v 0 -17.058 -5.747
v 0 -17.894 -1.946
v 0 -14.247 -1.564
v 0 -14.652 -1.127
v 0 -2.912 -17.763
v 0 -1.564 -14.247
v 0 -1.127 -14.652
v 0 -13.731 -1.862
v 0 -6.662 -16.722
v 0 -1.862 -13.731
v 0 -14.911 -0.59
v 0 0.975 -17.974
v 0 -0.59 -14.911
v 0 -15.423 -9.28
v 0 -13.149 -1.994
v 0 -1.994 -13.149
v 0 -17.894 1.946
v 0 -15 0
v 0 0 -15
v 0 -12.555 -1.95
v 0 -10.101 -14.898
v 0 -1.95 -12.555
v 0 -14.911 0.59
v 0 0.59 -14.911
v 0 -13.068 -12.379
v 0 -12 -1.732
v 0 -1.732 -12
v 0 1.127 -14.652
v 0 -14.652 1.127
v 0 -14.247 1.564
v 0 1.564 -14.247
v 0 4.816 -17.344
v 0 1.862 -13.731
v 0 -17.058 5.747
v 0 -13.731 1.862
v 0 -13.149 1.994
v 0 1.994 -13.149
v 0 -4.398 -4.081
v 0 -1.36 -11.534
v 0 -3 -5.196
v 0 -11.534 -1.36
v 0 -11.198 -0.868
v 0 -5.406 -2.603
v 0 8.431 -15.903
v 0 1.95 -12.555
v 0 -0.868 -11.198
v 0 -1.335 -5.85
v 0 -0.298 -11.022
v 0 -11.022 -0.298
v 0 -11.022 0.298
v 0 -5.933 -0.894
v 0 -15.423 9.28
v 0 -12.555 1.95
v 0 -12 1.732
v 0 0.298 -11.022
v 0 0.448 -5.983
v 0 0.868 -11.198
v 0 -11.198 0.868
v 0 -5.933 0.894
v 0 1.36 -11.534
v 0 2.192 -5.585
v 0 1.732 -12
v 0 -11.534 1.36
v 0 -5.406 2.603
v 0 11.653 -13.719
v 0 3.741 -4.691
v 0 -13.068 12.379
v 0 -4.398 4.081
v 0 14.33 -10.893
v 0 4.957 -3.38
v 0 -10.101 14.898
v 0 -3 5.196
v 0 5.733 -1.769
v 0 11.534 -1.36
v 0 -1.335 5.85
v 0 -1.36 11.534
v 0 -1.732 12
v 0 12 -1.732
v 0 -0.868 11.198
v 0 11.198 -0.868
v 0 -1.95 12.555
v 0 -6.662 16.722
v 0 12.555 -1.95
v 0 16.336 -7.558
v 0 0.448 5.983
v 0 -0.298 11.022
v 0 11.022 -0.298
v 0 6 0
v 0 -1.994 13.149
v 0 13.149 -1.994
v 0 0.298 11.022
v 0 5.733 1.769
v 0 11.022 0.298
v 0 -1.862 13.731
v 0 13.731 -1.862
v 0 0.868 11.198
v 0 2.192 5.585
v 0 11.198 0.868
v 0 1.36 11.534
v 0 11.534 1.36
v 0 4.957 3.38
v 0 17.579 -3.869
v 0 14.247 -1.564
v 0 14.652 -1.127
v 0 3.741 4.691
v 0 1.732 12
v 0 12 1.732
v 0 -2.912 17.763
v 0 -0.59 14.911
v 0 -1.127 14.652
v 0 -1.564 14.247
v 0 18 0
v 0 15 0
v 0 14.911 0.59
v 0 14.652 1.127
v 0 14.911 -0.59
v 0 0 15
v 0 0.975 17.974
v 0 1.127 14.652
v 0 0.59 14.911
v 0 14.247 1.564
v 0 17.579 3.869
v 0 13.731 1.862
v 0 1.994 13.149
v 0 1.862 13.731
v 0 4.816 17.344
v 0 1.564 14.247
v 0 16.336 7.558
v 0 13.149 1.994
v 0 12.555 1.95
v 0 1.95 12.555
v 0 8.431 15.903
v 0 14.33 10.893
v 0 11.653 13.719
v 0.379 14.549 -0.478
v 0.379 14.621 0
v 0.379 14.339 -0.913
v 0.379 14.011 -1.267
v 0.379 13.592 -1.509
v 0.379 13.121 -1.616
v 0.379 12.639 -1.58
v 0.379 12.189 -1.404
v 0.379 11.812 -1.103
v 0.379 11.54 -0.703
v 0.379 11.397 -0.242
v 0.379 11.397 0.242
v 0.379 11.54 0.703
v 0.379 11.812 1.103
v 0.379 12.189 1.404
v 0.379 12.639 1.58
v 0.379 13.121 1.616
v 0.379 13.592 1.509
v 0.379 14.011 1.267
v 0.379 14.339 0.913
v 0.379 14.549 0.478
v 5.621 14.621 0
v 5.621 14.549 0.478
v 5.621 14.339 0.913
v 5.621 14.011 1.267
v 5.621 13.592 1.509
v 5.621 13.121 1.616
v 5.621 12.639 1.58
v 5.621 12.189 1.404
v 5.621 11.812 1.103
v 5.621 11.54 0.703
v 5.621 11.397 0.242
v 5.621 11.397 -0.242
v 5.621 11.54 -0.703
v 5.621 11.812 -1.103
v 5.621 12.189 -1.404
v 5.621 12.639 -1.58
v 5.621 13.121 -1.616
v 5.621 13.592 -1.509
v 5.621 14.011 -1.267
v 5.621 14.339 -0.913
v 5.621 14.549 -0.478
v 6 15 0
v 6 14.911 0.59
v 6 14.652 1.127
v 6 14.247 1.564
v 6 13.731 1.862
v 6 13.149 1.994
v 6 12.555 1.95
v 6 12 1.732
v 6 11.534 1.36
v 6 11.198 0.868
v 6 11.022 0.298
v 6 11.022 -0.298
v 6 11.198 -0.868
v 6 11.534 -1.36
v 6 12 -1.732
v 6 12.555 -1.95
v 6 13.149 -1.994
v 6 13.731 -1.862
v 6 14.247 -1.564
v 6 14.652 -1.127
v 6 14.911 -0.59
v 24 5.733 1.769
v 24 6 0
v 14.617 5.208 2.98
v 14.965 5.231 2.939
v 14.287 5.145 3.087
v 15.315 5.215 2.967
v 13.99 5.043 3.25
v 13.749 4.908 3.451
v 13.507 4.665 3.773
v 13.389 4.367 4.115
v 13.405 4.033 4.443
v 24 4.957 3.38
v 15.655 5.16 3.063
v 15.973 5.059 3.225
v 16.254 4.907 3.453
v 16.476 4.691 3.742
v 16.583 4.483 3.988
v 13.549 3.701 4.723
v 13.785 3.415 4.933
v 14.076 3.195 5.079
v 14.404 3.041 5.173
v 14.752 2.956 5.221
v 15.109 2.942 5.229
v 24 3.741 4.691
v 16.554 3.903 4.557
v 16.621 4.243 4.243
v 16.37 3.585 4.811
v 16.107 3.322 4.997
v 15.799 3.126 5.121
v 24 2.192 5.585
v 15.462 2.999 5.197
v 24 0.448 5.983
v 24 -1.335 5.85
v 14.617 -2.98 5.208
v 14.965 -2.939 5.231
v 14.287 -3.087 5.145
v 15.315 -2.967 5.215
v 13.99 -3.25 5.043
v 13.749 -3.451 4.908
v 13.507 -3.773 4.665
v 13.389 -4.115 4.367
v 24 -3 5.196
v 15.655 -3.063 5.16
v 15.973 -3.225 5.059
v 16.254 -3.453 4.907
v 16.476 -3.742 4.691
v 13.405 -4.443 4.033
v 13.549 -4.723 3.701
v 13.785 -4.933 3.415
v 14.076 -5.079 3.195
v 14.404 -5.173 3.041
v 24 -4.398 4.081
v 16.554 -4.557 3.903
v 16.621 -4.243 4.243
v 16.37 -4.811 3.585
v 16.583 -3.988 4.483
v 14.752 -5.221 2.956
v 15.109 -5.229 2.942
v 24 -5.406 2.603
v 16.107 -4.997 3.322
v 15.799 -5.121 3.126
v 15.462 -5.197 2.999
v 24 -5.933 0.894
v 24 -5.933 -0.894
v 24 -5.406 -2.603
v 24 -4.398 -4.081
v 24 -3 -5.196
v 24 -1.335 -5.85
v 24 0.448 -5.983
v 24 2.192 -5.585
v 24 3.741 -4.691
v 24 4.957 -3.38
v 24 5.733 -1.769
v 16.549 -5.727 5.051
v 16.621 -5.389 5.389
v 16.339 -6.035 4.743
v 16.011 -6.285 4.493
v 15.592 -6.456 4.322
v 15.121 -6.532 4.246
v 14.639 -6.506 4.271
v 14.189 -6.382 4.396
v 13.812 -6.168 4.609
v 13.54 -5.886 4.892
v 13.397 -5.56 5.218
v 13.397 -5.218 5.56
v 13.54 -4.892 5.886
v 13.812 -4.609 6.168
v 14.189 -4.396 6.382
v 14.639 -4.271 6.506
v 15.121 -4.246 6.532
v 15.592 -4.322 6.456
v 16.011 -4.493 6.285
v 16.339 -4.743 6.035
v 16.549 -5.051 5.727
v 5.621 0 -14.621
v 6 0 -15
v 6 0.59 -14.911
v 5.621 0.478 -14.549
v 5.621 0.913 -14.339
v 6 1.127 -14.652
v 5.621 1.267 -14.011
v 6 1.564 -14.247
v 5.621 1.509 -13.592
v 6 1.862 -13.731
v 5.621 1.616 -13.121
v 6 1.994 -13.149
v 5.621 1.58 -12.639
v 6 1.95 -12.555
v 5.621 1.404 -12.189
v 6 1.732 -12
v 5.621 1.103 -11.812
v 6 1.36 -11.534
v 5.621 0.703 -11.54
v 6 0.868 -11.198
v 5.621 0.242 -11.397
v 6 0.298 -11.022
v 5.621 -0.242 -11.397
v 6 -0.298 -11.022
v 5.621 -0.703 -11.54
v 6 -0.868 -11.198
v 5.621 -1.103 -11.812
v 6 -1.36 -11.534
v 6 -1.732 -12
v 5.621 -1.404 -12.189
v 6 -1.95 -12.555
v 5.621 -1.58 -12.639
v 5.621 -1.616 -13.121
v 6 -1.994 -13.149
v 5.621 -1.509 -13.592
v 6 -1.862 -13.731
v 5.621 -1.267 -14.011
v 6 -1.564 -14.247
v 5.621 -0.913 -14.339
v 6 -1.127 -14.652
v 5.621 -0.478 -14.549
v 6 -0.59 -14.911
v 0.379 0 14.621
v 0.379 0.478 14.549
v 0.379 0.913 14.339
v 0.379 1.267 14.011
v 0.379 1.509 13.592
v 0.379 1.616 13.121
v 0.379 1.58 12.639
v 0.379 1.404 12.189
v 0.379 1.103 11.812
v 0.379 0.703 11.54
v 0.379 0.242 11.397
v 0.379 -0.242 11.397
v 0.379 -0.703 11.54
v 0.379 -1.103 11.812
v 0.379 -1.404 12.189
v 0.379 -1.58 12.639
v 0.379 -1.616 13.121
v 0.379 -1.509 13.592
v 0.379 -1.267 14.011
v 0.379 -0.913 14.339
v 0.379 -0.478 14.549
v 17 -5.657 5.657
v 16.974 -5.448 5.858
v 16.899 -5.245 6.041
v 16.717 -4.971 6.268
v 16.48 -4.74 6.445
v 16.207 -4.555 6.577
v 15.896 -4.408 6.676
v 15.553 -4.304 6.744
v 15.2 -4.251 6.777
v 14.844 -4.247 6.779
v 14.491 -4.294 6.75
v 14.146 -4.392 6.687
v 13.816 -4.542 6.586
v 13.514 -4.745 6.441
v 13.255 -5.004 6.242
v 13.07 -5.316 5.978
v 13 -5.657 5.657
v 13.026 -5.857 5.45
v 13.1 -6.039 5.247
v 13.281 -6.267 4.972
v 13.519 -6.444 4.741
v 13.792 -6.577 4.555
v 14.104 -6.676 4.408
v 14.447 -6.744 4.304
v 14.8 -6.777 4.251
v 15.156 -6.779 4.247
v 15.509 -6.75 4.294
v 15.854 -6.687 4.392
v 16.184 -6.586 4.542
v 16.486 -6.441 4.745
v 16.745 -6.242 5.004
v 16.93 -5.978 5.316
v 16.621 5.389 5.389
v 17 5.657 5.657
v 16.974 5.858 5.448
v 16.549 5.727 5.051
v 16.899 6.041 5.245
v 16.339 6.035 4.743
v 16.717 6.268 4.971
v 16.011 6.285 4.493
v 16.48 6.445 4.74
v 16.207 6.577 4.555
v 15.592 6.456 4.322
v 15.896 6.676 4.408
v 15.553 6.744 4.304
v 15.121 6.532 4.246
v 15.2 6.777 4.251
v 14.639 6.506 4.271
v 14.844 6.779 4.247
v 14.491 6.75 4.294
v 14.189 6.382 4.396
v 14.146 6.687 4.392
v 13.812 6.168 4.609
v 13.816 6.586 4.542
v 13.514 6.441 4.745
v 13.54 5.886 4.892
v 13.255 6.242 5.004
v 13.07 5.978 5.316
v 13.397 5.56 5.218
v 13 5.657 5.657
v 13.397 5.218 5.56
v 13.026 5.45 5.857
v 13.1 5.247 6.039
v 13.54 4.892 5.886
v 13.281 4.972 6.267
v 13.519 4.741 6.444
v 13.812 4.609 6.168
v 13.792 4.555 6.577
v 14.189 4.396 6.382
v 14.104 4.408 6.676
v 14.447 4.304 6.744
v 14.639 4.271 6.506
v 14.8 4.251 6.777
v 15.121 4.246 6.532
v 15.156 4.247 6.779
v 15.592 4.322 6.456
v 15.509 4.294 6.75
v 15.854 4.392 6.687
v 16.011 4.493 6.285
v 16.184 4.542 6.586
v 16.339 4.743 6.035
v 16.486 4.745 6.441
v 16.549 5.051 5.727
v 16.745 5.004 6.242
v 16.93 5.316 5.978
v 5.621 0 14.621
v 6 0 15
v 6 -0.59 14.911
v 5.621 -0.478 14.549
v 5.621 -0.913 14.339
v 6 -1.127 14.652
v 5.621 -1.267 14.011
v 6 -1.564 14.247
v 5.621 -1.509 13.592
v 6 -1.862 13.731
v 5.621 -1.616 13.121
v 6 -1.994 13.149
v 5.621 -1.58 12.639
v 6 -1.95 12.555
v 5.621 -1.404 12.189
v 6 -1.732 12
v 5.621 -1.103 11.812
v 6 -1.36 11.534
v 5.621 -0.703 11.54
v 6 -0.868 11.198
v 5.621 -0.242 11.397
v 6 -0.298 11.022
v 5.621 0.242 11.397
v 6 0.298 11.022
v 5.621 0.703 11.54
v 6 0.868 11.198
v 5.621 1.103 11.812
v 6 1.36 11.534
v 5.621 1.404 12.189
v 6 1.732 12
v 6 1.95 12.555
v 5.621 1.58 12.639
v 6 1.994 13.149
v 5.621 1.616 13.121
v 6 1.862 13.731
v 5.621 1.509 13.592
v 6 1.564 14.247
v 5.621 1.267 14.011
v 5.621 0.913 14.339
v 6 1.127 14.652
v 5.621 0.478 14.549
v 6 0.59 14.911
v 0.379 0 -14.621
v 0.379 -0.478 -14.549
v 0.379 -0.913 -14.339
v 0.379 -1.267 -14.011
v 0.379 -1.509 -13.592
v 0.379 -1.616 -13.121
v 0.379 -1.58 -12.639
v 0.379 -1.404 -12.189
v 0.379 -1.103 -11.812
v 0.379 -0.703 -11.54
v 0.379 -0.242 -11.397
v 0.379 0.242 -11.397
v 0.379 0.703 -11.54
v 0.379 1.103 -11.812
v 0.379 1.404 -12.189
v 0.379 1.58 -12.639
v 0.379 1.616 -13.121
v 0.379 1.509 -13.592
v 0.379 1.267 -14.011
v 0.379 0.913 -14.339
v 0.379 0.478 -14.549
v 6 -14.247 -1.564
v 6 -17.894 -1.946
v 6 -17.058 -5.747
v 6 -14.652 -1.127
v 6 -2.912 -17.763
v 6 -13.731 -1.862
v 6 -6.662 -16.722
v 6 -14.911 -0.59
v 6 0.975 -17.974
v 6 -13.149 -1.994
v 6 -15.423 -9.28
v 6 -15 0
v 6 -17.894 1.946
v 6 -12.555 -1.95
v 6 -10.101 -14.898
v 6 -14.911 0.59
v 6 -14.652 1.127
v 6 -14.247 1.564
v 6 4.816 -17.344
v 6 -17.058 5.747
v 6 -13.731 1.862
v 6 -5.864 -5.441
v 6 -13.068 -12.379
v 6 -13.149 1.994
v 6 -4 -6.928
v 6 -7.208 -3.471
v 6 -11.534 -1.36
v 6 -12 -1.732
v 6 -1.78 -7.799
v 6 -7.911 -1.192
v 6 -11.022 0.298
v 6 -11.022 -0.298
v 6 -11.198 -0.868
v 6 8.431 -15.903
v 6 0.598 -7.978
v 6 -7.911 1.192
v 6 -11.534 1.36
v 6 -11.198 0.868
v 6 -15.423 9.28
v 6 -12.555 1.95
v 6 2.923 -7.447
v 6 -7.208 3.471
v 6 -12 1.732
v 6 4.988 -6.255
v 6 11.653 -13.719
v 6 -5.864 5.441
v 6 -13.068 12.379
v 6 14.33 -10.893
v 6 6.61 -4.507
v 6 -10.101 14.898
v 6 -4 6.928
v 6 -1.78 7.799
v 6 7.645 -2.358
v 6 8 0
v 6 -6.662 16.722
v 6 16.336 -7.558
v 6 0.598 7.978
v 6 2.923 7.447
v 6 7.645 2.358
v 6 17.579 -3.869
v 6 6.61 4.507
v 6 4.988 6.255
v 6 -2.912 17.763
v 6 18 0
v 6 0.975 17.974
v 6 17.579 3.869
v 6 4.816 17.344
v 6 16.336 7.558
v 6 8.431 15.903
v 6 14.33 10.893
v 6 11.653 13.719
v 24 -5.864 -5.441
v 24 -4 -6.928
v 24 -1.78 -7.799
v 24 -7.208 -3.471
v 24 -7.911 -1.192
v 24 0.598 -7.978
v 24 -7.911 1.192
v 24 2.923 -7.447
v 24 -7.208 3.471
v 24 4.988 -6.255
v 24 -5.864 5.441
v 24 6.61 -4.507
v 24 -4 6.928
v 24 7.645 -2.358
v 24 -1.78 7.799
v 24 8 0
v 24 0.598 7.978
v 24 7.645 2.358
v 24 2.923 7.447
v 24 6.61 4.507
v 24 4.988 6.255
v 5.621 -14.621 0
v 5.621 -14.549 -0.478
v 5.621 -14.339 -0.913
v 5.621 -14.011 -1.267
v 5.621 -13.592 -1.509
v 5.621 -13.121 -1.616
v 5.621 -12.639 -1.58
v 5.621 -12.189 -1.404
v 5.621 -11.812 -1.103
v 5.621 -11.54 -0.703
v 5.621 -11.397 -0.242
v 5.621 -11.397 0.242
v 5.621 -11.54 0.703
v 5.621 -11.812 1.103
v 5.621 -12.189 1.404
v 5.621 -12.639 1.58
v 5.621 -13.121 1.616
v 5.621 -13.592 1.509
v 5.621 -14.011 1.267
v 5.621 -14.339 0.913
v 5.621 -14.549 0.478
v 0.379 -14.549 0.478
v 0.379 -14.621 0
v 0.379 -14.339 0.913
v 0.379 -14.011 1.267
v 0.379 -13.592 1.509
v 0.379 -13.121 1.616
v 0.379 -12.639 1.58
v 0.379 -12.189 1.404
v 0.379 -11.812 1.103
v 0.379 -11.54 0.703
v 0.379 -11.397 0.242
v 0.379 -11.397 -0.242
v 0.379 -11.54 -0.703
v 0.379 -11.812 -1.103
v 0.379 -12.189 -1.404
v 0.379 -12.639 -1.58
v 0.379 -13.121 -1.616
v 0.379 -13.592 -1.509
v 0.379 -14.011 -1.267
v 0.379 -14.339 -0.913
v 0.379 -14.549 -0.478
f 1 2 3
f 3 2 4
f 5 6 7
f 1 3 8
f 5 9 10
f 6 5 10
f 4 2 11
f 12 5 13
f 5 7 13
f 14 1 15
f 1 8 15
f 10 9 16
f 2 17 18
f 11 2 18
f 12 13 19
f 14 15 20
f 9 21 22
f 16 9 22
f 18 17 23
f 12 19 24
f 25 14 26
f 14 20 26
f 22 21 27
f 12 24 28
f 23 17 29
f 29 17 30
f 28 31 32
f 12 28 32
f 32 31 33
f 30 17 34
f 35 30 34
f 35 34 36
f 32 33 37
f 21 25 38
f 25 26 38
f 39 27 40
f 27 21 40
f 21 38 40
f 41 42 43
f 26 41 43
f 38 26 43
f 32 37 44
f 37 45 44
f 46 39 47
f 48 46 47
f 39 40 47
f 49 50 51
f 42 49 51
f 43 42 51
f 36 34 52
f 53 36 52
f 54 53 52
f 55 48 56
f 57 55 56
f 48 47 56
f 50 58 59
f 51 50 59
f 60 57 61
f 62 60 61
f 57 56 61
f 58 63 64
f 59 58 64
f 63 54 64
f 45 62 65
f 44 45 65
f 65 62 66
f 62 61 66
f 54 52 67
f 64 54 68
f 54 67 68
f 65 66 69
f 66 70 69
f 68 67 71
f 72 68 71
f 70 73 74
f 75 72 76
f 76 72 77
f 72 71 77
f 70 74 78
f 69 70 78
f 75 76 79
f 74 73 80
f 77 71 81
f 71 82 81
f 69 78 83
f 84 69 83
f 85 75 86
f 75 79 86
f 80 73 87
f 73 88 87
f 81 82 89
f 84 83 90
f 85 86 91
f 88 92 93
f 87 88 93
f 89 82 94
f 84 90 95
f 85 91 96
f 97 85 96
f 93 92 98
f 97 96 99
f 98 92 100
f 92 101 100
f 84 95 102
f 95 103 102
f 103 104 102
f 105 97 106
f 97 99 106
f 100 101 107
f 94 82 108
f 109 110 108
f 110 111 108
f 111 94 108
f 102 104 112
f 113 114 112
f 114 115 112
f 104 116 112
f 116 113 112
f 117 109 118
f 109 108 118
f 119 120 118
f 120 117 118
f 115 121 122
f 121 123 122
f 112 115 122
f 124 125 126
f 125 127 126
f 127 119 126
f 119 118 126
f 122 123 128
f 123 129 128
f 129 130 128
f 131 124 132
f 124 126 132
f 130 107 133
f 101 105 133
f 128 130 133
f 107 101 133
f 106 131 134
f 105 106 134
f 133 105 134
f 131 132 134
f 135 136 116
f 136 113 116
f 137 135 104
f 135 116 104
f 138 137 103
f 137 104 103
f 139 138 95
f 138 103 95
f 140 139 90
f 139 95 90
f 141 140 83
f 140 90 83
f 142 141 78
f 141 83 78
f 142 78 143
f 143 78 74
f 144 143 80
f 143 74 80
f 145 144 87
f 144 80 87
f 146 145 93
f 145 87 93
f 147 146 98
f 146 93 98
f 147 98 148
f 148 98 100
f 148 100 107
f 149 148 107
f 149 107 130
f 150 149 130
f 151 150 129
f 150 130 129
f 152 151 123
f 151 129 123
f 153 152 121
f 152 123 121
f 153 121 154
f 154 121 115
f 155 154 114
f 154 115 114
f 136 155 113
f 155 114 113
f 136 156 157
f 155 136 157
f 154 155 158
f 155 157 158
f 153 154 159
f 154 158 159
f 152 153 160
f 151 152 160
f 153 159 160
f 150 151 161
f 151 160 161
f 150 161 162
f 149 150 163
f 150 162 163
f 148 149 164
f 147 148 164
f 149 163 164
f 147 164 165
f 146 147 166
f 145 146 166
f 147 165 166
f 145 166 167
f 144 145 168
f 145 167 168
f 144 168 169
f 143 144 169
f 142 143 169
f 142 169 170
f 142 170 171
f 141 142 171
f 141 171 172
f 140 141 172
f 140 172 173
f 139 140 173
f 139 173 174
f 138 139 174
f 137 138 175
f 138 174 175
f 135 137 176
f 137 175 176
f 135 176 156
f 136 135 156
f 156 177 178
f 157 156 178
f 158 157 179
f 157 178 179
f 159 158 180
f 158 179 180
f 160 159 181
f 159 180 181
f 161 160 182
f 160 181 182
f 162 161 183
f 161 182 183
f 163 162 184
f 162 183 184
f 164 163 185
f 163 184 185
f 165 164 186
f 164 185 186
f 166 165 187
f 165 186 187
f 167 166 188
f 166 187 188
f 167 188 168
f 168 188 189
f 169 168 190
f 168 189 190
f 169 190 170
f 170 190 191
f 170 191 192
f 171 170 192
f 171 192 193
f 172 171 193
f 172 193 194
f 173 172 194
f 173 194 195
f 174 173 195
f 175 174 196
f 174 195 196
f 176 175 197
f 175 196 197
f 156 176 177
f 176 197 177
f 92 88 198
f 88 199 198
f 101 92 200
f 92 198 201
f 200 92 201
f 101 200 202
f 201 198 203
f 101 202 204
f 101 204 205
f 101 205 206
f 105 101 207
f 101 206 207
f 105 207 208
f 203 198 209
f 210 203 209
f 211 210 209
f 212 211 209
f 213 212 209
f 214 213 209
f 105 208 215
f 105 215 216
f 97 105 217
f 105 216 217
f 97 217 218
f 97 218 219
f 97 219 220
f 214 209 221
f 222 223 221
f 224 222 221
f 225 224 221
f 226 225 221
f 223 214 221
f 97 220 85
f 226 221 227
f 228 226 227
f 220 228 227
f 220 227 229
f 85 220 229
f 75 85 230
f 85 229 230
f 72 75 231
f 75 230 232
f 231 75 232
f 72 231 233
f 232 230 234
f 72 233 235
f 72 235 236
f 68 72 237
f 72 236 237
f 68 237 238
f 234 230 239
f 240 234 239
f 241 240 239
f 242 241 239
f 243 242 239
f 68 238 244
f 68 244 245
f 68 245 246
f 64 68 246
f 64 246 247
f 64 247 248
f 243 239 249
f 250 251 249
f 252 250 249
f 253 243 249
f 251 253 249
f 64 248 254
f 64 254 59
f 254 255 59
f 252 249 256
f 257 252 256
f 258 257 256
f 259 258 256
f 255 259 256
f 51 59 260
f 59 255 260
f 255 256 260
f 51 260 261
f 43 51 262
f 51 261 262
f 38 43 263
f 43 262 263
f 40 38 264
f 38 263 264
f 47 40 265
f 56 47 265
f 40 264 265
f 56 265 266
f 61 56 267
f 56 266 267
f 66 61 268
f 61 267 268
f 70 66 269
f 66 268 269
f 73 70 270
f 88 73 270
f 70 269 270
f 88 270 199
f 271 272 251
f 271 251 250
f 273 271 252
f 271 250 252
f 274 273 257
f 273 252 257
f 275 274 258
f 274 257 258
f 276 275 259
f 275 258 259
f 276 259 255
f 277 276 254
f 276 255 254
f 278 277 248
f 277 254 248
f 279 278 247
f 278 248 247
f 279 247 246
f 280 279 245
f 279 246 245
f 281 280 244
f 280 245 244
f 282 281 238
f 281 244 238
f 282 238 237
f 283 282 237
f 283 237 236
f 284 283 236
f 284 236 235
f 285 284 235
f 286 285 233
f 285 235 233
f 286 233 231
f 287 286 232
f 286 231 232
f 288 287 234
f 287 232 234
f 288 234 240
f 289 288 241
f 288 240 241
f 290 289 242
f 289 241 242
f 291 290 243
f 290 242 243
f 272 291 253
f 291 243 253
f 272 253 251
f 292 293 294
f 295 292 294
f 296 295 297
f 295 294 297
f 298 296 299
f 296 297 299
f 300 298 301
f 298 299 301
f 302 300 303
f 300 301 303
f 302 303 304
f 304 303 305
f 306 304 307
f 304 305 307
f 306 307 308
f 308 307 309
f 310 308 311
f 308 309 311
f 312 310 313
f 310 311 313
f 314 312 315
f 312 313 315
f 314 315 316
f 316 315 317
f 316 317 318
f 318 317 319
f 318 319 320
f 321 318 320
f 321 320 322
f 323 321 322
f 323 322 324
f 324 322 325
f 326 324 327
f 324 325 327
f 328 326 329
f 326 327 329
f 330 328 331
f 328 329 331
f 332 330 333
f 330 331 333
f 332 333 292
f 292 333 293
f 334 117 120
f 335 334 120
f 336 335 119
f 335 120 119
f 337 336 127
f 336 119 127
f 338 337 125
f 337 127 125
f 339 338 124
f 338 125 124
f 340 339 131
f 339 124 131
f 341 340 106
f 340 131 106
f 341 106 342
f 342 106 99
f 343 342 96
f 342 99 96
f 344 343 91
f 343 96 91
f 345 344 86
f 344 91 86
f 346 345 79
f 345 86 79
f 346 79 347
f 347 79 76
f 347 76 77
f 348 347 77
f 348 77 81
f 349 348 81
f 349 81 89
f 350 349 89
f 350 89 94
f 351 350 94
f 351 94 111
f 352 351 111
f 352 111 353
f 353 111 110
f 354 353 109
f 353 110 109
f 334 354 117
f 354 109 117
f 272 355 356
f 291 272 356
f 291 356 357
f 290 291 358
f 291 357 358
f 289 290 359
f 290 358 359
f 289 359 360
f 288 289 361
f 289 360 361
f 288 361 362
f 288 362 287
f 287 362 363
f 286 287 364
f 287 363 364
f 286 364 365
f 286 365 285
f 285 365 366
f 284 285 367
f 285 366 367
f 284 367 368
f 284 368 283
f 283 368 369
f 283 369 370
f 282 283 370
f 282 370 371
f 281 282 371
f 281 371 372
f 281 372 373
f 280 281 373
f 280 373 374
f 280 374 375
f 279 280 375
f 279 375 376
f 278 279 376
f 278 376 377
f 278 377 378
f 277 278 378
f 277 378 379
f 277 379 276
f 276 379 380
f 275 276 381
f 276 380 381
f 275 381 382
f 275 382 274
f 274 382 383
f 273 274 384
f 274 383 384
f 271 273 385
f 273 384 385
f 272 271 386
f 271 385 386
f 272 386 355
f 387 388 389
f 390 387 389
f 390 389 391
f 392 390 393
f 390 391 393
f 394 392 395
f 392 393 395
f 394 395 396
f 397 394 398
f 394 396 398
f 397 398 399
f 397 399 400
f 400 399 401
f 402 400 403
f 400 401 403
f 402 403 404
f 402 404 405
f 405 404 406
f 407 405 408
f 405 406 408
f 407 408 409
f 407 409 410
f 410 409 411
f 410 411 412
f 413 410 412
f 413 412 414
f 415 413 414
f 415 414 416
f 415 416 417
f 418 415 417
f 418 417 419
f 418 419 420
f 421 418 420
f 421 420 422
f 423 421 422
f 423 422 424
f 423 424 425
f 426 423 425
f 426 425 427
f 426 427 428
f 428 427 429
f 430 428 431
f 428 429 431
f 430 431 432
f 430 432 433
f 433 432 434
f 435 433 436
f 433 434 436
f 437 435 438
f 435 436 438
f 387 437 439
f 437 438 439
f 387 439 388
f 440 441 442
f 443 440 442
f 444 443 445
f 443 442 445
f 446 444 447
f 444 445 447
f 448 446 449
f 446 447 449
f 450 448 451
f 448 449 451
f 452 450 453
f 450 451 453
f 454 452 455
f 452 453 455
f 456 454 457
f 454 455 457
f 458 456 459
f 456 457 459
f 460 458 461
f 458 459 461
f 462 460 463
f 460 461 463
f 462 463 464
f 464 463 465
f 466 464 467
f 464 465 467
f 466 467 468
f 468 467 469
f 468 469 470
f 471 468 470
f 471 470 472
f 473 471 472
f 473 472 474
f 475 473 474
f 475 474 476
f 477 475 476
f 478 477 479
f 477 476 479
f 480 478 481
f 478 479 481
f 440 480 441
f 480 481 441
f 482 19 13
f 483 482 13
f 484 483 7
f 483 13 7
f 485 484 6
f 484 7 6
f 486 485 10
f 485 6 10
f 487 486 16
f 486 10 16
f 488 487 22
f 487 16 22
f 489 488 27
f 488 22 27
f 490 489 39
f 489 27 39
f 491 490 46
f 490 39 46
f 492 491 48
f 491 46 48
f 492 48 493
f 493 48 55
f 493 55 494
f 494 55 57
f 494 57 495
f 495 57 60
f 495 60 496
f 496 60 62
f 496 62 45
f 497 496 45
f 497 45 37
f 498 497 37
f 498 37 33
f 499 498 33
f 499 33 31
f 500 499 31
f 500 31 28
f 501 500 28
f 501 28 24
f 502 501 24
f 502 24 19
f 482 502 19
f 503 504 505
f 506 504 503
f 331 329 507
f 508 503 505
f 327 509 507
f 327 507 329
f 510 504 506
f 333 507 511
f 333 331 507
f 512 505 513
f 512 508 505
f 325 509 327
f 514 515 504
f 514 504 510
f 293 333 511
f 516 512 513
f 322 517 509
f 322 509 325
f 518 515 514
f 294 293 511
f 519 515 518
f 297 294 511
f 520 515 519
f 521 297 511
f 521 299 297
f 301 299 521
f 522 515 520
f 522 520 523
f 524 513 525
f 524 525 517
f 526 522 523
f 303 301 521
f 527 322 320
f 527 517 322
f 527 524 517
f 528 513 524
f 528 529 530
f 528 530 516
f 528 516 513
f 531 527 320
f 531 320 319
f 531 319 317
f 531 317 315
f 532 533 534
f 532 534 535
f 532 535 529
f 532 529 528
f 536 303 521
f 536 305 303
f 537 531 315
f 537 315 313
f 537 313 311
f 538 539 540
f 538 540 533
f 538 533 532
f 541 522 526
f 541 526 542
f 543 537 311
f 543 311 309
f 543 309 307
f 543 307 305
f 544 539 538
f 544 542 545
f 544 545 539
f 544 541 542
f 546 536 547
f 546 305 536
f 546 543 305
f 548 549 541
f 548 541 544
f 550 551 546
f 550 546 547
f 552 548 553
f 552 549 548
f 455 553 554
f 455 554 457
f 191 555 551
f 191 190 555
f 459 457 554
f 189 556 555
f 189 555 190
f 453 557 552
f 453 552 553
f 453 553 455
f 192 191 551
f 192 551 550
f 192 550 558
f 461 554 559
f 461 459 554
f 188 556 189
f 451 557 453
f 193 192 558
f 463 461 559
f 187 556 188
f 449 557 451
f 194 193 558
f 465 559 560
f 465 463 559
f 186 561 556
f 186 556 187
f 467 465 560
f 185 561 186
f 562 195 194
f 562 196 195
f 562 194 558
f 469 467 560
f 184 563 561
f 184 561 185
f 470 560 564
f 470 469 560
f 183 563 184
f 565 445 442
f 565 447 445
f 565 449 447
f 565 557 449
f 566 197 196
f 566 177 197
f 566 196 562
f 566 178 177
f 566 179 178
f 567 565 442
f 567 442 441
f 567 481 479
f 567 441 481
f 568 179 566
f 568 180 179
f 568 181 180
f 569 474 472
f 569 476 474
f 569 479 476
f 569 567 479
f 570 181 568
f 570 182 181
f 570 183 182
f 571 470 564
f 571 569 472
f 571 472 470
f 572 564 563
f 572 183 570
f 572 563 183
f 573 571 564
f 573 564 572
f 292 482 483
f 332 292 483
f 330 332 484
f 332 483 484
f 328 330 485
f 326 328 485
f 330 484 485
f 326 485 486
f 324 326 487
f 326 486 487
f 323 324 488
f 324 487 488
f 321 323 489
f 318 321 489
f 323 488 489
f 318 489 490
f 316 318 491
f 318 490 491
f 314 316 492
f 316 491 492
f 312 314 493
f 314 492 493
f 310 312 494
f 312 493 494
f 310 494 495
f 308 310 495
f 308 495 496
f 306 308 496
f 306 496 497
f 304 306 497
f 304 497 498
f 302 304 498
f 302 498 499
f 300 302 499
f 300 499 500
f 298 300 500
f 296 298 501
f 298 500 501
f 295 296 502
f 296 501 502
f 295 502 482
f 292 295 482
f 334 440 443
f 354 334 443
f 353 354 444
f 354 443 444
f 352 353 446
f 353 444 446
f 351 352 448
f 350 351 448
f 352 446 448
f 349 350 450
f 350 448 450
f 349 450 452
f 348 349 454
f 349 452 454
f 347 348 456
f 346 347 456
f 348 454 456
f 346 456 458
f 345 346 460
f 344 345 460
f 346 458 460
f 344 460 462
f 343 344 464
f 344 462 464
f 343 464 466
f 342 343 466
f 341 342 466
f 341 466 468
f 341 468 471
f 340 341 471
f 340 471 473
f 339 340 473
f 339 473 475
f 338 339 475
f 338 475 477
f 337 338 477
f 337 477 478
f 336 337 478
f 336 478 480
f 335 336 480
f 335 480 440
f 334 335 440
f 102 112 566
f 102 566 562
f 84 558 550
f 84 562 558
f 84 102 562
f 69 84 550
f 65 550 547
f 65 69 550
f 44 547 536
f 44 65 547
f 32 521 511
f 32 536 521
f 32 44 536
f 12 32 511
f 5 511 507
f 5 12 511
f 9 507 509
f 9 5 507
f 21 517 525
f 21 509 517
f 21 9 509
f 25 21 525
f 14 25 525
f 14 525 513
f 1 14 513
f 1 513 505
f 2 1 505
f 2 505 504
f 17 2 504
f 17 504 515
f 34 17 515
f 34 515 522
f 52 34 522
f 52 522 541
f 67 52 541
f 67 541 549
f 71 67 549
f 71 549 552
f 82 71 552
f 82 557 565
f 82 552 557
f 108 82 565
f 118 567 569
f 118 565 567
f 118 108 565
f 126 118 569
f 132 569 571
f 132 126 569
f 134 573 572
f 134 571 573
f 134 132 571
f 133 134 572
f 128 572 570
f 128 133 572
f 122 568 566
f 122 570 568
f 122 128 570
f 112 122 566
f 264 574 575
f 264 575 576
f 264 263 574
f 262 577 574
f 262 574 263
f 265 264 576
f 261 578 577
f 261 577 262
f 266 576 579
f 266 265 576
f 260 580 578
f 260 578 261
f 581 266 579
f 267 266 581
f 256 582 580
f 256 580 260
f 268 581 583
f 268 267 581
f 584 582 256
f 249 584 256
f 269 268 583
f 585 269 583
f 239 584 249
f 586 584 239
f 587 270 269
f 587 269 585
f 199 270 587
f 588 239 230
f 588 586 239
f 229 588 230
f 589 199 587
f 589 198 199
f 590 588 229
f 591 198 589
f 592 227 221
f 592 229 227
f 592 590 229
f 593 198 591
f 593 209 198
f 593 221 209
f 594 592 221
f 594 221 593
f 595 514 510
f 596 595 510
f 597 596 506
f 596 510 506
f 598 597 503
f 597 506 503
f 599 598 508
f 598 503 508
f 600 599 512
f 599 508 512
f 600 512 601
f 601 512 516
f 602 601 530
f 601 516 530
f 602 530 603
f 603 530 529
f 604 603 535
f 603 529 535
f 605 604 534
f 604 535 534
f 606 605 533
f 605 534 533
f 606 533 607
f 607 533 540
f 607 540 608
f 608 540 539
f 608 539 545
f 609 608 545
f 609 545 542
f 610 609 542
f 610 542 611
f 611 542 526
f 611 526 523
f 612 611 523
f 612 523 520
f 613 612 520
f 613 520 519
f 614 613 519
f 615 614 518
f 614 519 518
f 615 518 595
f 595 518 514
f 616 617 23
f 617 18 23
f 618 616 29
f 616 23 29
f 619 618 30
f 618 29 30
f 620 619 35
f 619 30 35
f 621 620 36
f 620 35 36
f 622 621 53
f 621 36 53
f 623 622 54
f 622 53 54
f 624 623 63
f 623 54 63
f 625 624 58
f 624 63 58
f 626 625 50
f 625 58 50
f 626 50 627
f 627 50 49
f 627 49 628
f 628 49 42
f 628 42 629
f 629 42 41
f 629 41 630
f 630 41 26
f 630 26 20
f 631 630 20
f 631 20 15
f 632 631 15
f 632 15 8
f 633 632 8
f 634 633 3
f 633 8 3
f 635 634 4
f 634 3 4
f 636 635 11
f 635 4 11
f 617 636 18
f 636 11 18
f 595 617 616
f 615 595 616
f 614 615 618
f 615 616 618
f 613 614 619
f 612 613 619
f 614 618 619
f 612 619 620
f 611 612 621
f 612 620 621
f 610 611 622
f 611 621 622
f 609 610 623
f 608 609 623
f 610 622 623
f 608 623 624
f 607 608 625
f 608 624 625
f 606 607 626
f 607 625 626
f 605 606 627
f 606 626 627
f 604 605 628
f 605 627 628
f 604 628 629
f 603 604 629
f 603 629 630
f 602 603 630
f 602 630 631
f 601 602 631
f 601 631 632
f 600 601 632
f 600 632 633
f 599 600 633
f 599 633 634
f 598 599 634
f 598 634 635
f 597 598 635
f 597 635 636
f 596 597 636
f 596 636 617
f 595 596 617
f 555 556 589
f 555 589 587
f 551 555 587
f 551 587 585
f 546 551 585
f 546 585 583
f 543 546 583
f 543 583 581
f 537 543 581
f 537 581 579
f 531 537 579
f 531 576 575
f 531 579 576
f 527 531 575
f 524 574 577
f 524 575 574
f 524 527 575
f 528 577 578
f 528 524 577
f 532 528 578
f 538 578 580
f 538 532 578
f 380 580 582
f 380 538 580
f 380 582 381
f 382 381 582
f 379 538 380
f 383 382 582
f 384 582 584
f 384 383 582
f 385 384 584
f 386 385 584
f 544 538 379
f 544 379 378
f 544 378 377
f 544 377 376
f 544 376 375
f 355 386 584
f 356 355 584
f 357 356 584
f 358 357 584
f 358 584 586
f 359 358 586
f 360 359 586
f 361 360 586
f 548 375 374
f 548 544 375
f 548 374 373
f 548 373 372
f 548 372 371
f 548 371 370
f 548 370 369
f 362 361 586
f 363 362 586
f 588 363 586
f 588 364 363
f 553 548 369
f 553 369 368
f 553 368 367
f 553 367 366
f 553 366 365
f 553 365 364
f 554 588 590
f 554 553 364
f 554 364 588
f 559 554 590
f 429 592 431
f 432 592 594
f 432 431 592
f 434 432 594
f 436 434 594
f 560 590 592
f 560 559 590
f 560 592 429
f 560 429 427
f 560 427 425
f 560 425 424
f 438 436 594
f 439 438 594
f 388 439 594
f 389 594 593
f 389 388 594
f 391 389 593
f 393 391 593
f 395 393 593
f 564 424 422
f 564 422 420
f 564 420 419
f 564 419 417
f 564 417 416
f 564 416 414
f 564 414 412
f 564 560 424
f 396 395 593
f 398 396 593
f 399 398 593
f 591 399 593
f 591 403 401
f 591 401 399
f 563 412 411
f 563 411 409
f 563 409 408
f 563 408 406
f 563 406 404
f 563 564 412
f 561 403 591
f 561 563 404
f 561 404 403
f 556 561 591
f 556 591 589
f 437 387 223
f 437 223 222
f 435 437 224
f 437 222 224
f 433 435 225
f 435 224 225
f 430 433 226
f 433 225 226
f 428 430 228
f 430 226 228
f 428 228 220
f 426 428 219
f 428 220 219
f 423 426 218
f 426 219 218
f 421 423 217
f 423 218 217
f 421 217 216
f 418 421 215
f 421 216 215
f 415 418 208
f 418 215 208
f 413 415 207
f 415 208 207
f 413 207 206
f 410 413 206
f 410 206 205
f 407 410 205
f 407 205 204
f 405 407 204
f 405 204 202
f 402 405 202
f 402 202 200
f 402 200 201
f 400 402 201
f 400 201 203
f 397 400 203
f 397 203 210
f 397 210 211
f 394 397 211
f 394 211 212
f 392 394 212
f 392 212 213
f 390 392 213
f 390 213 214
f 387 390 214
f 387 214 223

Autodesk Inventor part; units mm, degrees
sketch "Sketch_1" plane through (0, 0, 0) normal (0, 0, 1) x (1, 0, 0)
  line L0 (24, 0) -> (0, 0)
  line L1 (0, 18) -> (0, 6)
  line L2 (0, 6) -> (24, 6)
  line L3 (24, 6) -> (24, 8)
  line L4 (24, 8) -> (6, 8)
  line L5 (6, 8) -> (6, 18)
  line L6 (6, 18) -> (0, 18)
revolve "Revolution1" add sketch "Sketch_1" angle 360 about axis through (24, 0, 0) along (1, 0, 0)
sketch "Sketch_3" plane through (0, 0, 0) normal (0, -0.7071, 0.7071) x (1, 0, 0)
  line L0 (15, 5.5) -> (15, 8)
  line L1 (15, 8) -> (17, 8)
  line L2 (17, 8) -> (16.621, 7.621)
  line L3 (16.621, 7.621) -> (16.621, 5.5)
  line L4 (16.621, 5.5) -> (15, 5.5)
  line L5 (15, 5.5) -> (15, 8)
revolve "Revolution2" cut sketch "Sketch_3" angle 360 about axis through (15, 3.8891, 3.8891) along (0, -0.7071, -0.7071)
thread "Thread1" size "M4x0.7" class "6H" standard "ISO Metric profile" length 2.121
sketch "Sketch_2" plane through (0, 0, 0) normal (0, -0.7071, -0.7071) x (1, 0, 0)
  line L0 (15, 5.5) -> (15, 8)
  line L1 (15, 8) -> (17, 8)
  line L2 (17, 8) -> (16.621, 7.621)
  line L3 (16.621, 7.621) -> (16.621, 5.5)
  line L4 (16.621, 5.5) -> (15, 5.5)
  line L5 (15, 5.5) -> (15, 8)
revolve "Revolution3" cut sketch "Sketch_2" angle 360 about axis through (15, -3.8891, 3.8891) along (0, 0.7071, -0.7071)
thread "Thread2" size "M4x0.7" class "6H" standard "ISO Metric profile" length 2.121
sketch "Sketch_4" plane through (0, 0, 0) normal (0, 0, 1) x (1, 0, 0)
  line L0 (6, 13) -> (0, 13)
  line L1 (0, 13) -> (0, 15)
  line L2 (0, 15) -> (0.379, 14.621)
  line L3 (0.379, 14.621) -> (5.621, 14.621)
  line L4 (5.621, 14.621) -> (6, 15)
  line L5 (6, 15) -> (6, 13)
  line L6 (6, 13) -> (0, 13)
revolve "Revolution4" cut sketch "Sketch_4" angle 360 about axis through (6, 13, 0) along (1, 0, 0)
thread "Thread3" size "M4x0.7" class "6H" standard "ISO Metric profile" full length
sketch "Sketch_9" plane through (0, 0, 0) normal (0, -1, 0) x (1, 0, 0)
  line L0 (0, -13) -> (6, -13)
  line L1 (6, -13) -> (6, -15)
  line L2 (6, -15) -> (5.621, -14.621)
  line L3 (5.621, -14.621) -> (0.379, -14.621)
  line L4 (0.379, -14.621) -> (0, -15)
  line L5 (0, -15) -> (0, -13)
  line L6 (0, -13) -> (6, -13)
revolve "Revolution5" cut sketch "Sketch_9" angle 360 about axis through (0, 0, -13) along (-1, 0, 0)
thread "Thread4" size "M4x0.7" class "6H" standard "ISO Metric profile" full length
sketch "Sketch_10" plane through (0, 0, 0) normal (0, 0, 1) x (1, 0, 0)
  line L0 (0, -13) -> (6, -13)
  line L1 (6, -13) -> (6, -15)
  line L2 (6, -15) -> (5.621, -14.621)
  line L3 (5.621, -14.621) -> (0.379, -14.621)
  line L4 (0.379, -14.621) -> (0, -15)
  line L5 (0, -15) -> (0, -13)
  line L6 (0, -13) -> (6, -13)
revolve "Revolution6" cut sketch "Sketch_10" angle 360 about axis through (0, -13, 0) along (-1, 0, 0)
thread "Thread5" size "M4x0.7" class "6H" standard "ISO Metric profile" full length
sketch "Sketch_11" plane through (0, 0, 0) normal (0, -1, 0) x (1, 0, 0)
  line L0 (6, 13) -> (0, 13)
  line L1 (0, 13) -> (0, 15)
  line L2 (0, 15) -> (0.379, 14.621)
  line L3 (0.379, 14.621) -> (5.621, 14.621)
  line L4 (5.621, 14.621) -> (6, 15)
  line L5 (6, 15) -> (6, 13)
  line L6 (6, 13) -> (0, 13)
revolve "Revolution7" cut sketch "Sketch_11" angle 360 about axis through (6, 0, 13) along (1, 0, 0)
thread "Thread6" size "M4x0.7" class "6H" standard "ISO Metric profile" full length
ref_plane "to_screw1_XY" through (15, 4.2426, 4.2426) normal (0, 0.7071, 0.7071) x (1, 0, 0)
ref_plane "to_screw1_YZ" through (15, 4.2426, 4.2426) normal (1, 0, 0) x (0, 0.7071, -0.7071)
ref_plane "to_screw1_ZX" through (15, 4.2426, 4.2426) normal (0, 0.7071, -0.7071) x (0, 0.7071, 0.7071)
ref_plane "to_screw2_XY" through (15, -4.2426, 4.2426) normal (0, -0.7071, 0.7071) x (1, 0, 0)
ref_plane "to_screw2_YZ" through (15, -4.2426, 4.2426) normal (1, 0, 0) x (0, 0.7071, 0.7071)
ref_plane "to_screw2_ZX" through (15, -4.2426, 4.2426) normal (0, 0.7071, 0.7071) x (0, -0.7071, 0.7071)
properties part number "SSTHRT12-MB_b"
